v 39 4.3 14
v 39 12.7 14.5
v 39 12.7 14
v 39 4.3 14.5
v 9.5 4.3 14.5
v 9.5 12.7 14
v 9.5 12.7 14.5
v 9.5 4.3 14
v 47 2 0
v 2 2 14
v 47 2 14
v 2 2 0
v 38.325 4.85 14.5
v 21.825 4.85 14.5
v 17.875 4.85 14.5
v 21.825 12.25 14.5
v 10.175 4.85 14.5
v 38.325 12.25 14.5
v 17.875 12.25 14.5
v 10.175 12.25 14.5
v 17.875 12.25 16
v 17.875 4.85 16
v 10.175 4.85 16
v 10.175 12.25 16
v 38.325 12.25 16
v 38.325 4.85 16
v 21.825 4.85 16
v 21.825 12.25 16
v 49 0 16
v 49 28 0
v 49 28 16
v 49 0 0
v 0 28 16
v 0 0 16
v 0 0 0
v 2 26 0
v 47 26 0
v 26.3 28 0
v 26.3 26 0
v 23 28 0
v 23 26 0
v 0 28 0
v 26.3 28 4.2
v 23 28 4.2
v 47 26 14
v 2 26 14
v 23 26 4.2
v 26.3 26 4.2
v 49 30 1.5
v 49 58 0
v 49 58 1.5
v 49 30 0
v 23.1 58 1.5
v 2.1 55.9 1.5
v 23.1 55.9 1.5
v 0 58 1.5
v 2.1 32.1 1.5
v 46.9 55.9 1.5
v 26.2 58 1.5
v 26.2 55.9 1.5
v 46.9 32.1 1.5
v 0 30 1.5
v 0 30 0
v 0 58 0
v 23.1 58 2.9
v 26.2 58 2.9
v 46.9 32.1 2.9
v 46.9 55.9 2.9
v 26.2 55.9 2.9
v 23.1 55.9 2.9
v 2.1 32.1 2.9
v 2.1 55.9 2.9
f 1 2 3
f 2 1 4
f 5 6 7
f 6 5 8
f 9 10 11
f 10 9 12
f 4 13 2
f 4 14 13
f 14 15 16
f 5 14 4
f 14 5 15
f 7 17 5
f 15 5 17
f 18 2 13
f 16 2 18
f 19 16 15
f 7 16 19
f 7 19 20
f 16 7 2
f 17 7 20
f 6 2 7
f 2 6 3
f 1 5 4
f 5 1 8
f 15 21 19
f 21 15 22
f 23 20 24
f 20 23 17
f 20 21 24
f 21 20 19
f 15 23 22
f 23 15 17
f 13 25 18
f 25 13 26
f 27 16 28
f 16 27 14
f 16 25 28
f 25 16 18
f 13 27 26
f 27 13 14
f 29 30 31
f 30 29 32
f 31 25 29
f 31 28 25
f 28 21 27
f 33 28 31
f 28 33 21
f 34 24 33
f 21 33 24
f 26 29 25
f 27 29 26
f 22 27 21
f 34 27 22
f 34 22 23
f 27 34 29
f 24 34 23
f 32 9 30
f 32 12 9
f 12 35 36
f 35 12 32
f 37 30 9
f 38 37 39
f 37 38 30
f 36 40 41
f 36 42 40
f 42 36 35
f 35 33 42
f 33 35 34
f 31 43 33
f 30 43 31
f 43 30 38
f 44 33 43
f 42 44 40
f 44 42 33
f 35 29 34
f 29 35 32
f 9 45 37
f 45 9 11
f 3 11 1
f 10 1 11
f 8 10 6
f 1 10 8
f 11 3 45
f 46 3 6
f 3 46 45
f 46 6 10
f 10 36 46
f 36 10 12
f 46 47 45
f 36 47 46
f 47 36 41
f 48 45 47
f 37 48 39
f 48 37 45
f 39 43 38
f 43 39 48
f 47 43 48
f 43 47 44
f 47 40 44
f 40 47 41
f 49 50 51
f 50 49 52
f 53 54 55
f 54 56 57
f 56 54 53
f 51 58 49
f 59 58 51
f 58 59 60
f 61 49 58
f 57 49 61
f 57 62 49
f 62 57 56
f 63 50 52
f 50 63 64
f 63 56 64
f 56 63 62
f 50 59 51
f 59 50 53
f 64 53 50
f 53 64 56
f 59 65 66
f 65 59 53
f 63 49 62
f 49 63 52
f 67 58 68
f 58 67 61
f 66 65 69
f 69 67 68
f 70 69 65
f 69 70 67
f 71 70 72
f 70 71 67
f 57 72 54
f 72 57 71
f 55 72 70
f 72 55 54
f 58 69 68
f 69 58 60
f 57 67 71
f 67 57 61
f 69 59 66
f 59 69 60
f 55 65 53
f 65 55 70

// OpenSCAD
// file: sharp-ir-distance.scad
echo(version=version());

// Values are in millimeters

$fa=1;
$fs=1;
////////////////////////////


module sharp_ir_distance_mount() {
	dia=3.75*2;
	difference() {
		union() {
			cylinder(h=2, d=dia);
			translate([0,-dia/2,0]) cube([dia,dia,2]);
		}
		translate([0,0,-0.5]) cylinder(h=3, d=(3.2));
	}
}
module sharp_ir_distance_connector() {
	cube([10.1, 18.9-13, 1.2]);
}
module sharp_ir_distance(fuzz=0) {
	translate([3.75*2,0,0]) {
		cube([29.5, 13, 13.5 - 6.3]);
		translate([0,(13-8.4)/2,0]) cube([29.5, 8.4, 13.5 - 2]);

		top_len = 7.5+4.15+16.3;
		top_rim = (29.5 - top_len)/2;

		translate([top_rim-fuzz,(13-7.2-fuzz)/2,0]) cube([7.5+(fuzz*2), 7.2+(fuzz*2), 13.5]);
		translate([top_rim+7.5+4.15-fuzz,(13-7.2-fuzz)/2,0]) cube([16.3+(fuzz*2), 7.2+(fuzz*2), 13.5]);

		center_offset_mount = (37 - 29.5)/2;
		translate([-center_offset_mount,(13-7.2),0]) sharp_ir_distance_mount();
		translate([center_offset_mount+29.5,(13-7.2),0]) mirror() sharp_ir_distance_mount();


		translate([14.75-(10.1/2), 13, 3.3]) sharp_ir_distance_connector();
	}
}

//translate([3.75*2,0,0]) sharp_ir_distance();

//	vim: set ai sw=2 ts=2 :
// main file
echo(version=version());

// Values are in millimeters

$fa=1;
$fs=1;
////////////////////////////
include<sharp-ir-distance.scad>;

tolerance=0.1;

// case
difference() {
	cube([49,28,16]);
	translate([2,2,-1]) cube([45,24,15]);
	translate([2,2,3]) sharp_ir_distance(fuzz=tolerance);
	translate([23,25.5,3-4]) #cube([3.3,3,1.2+4]);
}
	translate([2,2,3]) %sharp_ir_distance(fuzz=tolerance);

// lid
translate([0, 30, 0]) {
	union() {
		cube([49,28,1.5]);
		translate([2+tolerance,2+tolerance,0])
			cube([45-(tolerance*2),24-(tolerance*2),2.9]);
		translate([23+tolerance,25,0])
			cube([3.3-(tolerance*2),3,2.9]);
	}
}

//	vim: set ai sw=2 ts=2 :
